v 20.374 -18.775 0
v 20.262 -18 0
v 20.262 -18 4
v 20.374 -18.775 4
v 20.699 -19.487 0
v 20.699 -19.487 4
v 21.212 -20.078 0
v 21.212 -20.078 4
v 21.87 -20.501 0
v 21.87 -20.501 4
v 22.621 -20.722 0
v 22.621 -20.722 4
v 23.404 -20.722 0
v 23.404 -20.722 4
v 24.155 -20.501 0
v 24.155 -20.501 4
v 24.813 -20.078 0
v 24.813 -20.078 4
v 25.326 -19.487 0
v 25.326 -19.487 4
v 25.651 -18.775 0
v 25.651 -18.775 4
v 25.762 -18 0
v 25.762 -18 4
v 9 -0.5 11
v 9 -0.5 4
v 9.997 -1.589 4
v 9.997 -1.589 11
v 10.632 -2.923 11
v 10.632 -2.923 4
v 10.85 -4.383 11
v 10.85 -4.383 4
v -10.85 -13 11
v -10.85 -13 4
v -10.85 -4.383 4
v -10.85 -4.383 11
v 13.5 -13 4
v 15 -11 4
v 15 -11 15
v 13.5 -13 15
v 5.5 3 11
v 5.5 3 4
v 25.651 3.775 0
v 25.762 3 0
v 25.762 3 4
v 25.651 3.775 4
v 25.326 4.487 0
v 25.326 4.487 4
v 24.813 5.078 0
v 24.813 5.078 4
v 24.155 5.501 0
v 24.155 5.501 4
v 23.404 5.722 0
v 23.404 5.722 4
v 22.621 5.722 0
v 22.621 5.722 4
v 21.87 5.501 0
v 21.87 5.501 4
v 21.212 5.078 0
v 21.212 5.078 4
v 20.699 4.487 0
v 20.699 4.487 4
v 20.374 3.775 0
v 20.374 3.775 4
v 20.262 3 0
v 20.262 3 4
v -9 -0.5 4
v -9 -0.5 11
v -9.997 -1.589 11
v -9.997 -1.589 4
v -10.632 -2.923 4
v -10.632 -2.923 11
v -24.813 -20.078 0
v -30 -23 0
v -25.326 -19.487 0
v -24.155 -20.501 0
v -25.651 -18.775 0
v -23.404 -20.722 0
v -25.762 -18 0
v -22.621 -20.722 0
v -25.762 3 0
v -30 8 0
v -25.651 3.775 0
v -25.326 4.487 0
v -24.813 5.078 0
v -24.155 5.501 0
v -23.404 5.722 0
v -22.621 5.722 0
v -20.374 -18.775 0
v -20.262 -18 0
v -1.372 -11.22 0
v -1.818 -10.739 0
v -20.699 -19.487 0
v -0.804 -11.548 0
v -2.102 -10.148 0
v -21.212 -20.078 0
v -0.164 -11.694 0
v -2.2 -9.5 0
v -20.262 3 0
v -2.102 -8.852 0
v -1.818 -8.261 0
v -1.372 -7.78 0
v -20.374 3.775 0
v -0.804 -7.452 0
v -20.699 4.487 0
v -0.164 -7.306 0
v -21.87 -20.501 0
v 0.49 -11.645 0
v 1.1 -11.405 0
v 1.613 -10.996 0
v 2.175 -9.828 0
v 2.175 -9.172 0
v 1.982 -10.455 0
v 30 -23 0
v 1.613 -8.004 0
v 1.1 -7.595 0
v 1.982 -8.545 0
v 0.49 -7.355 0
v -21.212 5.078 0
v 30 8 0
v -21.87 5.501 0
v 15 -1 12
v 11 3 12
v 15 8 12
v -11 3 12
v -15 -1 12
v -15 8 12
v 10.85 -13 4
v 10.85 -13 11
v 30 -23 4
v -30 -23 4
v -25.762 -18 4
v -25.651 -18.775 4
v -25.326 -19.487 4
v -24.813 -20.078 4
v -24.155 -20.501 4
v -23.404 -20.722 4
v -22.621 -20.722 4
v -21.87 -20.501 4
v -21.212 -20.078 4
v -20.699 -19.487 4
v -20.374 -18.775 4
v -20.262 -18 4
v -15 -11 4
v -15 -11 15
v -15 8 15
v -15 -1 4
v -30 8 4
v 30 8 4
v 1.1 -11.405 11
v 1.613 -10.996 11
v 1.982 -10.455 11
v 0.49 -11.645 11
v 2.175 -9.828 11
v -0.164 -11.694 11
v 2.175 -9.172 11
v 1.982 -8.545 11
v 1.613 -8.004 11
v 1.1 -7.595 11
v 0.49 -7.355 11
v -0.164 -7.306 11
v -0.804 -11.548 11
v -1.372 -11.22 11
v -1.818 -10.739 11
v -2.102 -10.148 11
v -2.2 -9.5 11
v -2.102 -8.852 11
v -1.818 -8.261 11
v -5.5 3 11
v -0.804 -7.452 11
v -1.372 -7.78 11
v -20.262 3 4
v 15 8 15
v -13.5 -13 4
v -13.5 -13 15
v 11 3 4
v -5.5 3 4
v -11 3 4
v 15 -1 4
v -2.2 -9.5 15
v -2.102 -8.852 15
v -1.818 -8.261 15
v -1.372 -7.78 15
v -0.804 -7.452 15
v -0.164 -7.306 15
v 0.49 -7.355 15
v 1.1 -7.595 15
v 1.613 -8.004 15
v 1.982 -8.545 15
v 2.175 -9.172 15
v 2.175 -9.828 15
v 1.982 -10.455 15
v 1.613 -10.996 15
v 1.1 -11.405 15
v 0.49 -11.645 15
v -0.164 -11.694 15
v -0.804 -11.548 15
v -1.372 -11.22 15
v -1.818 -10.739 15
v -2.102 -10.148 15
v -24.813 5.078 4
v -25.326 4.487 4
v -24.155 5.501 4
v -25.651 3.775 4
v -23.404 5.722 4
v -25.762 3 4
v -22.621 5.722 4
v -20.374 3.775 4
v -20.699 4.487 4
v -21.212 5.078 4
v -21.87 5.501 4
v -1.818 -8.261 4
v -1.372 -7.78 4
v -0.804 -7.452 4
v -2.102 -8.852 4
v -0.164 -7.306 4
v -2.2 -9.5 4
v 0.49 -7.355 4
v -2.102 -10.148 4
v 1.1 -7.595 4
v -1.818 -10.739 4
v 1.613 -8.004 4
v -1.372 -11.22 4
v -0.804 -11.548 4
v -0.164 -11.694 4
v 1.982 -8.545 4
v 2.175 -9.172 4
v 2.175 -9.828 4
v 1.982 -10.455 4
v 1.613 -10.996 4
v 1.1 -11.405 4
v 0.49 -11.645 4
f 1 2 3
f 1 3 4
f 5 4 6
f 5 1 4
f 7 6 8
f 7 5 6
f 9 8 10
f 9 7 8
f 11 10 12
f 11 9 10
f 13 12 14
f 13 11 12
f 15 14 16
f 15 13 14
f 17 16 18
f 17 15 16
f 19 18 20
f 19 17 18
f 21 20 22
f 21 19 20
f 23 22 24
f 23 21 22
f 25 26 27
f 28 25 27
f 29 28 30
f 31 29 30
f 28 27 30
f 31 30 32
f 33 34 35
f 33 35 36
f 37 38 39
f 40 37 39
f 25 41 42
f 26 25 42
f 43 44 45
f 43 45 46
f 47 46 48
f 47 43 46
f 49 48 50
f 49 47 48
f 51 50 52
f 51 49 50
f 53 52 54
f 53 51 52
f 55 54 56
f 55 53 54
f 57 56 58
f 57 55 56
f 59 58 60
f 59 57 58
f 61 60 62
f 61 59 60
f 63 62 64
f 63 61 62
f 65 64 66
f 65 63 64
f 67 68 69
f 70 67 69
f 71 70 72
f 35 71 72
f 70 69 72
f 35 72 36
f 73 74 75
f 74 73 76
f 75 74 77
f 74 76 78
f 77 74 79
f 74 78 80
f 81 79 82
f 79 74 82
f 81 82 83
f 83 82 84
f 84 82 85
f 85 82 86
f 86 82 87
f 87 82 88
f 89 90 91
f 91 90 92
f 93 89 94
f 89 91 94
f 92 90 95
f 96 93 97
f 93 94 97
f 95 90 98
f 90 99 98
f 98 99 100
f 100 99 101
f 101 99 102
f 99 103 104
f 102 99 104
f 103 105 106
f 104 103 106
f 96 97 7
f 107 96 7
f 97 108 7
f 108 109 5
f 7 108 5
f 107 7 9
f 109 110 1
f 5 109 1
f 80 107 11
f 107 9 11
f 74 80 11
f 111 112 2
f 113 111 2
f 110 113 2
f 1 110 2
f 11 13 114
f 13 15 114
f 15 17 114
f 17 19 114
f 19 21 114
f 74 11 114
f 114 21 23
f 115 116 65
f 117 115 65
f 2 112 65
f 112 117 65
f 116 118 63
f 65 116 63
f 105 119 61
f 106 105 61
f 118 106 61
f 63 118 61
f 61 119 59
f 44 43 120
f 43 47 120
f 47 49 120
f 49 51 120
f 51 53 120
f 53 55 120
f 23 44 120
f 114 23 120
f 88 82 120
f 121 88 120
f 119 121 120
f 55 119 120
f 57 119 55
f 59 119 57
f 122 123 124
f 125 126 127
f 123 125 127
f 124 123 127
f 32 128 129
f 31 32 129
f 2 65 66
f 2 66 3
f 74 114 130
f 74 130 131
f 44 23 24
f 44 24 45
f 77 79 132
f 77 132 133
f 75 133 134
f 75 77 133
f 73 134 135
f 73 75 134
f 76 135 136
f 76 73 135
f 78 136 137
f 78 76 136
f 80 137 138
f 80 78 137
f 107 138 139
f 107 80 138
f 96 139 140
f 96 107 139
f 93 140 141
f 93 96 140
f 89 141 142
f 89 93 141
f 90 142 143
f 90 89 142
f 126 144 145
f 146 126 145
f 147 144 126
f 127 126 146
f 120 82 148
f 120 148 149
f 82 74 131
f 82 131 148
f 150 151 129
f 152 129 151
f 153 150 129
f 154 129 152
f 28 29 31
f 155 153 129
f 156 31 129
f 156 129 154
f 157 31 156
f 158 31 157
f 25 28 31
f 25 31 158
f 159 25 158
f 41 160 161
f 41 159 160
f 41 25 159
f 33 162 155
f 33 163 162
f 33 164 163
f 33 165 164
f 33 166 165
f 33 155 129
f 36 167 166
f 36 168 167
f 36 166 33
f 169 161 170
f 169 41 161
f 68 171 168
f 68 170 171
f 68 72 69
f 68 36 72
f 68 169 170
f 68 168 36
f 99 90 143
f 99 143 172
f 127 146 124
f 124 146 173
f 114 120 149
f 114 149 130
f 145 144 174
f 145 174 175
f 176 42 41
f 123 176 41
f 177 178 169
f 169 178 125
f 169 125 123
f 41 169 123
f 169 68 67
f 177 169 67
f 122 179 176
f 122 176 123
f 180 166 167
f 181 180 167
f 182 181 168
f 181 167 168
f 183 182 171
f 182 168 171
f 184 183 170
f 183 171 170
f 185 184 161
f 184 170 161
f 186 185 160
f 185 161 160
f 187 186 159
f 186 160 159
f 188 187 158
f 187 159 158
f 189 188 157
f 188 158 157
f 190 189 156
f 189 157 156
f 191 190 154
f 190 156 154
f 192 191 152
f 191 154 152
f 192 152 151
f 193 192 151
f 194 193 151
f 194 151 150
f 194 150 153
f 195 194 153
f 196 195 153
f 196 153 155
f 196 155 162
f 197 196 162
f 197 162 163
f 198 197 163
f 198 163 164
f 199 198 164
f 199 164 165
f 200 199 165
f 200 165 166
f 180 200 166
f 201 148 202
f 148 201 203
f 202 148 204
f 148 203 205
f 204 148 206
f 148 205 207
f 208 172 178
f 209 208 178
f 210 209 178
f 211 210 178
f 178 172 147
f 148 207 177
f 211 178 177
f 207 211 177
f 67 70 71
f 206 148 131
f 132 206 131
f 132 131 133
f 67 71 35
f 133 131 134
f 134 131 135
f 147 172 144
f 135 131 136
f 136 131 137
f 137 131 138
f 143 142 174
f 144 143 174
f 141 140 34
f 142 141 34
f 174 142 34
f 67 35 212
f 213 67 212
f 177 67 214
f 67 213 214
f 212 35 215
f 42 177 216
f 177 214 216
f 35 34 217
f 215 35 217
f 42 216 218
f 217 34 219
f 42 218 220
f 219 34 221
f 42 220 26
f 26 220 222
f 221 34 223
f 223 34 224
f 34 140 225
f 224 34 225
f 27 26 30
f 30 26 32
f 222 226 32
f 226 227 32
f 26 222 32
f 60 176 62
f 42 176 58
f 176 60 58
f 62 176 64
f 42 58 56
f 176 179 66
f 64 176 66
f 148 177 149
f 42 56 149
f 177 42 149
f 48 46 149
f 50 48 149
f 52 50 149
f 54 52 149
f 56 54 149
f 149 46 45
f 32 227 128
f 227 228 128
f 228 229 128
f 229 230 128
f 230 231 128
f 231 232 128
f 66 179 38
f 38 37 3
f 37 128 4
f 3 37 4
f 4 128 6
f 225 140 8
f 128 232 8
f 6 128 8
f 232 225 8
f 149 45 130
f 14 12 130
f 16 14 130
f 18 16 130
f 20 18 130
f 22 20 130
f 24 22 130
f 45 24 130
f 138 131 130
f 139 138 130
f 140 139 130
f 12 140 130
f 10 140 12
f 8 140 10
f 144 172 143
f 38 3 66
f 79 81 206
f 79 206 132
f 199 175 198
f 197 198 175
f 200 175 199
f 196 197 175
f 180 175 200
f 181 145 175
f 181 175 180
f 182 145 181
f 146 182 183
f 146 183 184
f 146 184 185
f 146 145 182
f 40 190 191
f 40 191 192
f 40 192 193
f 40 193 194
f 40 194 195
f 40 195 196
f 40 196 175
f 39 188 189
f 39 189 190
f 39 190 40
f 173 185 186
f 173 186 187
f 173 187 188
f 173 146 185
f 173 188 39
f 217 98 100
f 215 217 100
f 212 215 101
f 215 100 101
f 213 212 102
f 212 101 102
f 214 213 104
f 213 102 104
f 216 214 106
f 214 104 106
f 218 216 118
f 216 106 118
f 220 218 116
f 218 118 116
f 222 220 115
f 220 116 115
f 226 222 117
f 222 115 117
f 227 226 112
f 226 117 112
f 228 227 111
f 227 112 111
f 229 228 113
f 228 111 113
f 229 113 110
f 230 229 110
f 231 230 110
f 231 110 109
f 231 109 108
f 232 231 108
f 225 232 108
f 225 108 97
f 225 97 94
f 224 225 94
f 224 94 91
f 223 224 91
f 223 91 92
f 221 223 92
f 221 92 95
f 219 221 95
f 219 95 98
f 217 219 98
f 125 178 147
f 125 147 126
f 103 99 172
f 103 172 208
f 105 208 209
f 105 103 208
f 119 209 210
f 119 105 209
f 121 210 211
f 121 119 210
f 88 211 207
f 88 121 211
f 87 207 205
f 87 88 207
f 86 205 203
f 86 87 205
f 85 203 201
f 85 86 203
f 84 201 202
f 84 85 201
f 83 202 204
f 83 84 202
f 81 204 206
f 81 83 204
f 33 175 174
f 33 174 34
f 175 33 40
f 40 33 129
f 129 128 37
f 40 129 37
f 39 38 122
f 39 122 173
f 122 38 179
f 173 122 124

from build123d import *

# Parameters (mm, degrees)
F0_W         = 30
F0_H         = 26
F1_DEPTH     = 15
F3_SIZE2     = 2
F3_SIZE      = 1.5
F5_DEPTH     = 30.001
F6_SIZE      = 4
F2_W         = 21.7
F2_H         = 7
F7_DEPTH     = 12.5
F8_W         = 11
F8_H         = 7
F9_DEPTH     = 4
F10_W        = 30
F10_H        = 5
F11_DEPTH    = 15.001
F13_D        = 4.4
F15_DEPTH    = 4
F16_SIZE     = 3.49999
F17_T4_DEPTH = 26.4149188769
F18_SIZE     = 3.49999
F19_T4_DEPTH = 26.4149188769


# Not quite as in the source:
# - a fillet or chamfer that OpenCascade refuses, or shapes differently, is made with other operations: its cross-section is extruded or revolved along the edge and cut away or added
# - a fillet or chamfer is up to 0.001 mm smaller than in the source, because OpenCascade refuses the exact size


with BuildPart() as f1:
    # F0 (on Top) → F1 (new body)
    with BuildSketch(Plane.XY):
        Rectangle(F0_W, F0_H)
    extrude(amount=F1_DEPTH)

    # F3
    f3_edges = [f1.edges().sort_by_distance(p)[0] for p in [
        (-15, -13, 7.5),
        (15, -13, 7.5),
    ]]
    f3_side = f1.faces().sort_by_distance((0, -13, 7.5))[0]
    chamfer(f3_edges, length=F3_SIZE, length2=F3_SIZE2, reference=f3_side)

    # F4 (on face) → F5 (cut, through all)
    with BuildSketch(Plane(origin=(-15, 0, 0), x_dir=(0, -1, 0), z_dir=(-1, 0, 0))):
        Polygon((-13, 12), (-13, 0), (-8, 0), (-8, 4), (-3, 4), (-3, 12), align=None)
    extrude(amount=-F5_DEPTH, mode=Mode.SUBTRACT)

    # F6
    f6_edges = [f1.edges().sort_by_distance(p)[0] for p in [
        (-15, 3, 8),
        (15, 3, 8),
    ]]
    chamfer(f6_edges, length=F6_SIZE)

    # F2 (on face) → F7 (cut)
    with BuildSketch(Plane.XZ.offset(13)):
        with Locations((0, 7.5)):
            Rectangle(F2_W, F2_H)
    extrude(amount=-F7_DEPTH, mode=Mode.SUBTRACT)

    # F8 (on face) → F9 (cut)
    with BuildSketch(Plane(origin=(0, 3, 0), x_dir=(-1, 0, 0), z_dir=(0, 1, 0))):
        with Locations((0, 7.5)):
            Rectangle(F8_W, F8_H)
    extrude(amount=-F9_DEPTH, mode=Mode.SUBTRACT)

    # F10 (on face) → F11 (cut, through all)
    with BuildSketch(Plane.XY.offset(15)):
        with Locations((0, 10.5)):
            Rectangle(F10_W, F10_H)
    extrude(amount=-F11_DEPTH, mode=Mode.SUBTRACT)

    # F13 (through all)
    with Locations(Plane.XY.offset(15)):
        with Locations((0, -9.5)):
            Hole(F13_D / 2)

    # F14 (on face) → F15 (join)
    with BuildSketch(Plane(origin=(0, 0, 0), x_dir=(1, 0, 0), z_dir=(0, 0, -1))):
        with BuildLine():
            Line((30, 23), (-30, 23))
            Line((-30, 23), (-30, 11))
            Line((-30, 11), (-25.7624481171, 11))
            Line((-25.7624481171, 11), (-25.7624481171, 18))
            ThreePointArc((-25.7624481171, 18), (-23.0124481171, 20.75), (-20.2624481171, 18))
            Line((-20.2624481171, 18), (-20.2624481171, 11))
            Line((-20.2624481171, 11), (-15, 11))
            Line((-15, 11), (-13.5, 13))
            Line((-13.5, 13), (13.5, 13))
            Line((13.5, 13), (15, 11))
            Line((15, 11), (20.2624481171, 11))
            Line((20.2624481171, 11), (20.2624481171, 18))
            ThreePointArc((20.2624481171, 18), (23.0124481171, 20.75), (25.7624481171, 18))
            Line((25.7624481171, 18), (25.7624481171, 11))
            Line((25.7624481171, 11), (30, 11))
            Line((30, 11), (30, 23))
        make_face()
        with BuildLine():
            Line((-25.7624481171, 11), (-30, 11))
            Line((-30, 11), (-30, -8))
            Line((-30, -8), (-15, -8))
            Line((-15, -8), (-15, 11))
            Line((-15, 11), (-20.2624481171, 11))
            Line((-20.2624481171, 11), (-20.2624481171, -3))
            ThreePointArc((-20.2624481171, -3), (-23.0124481171, -5.75), (-25.7624481171, -3))
            Line((-25.7624481171, -3), (-25.7624481171, 11))
        make_face()
        with BuildLine():
            Line((30, -8), (30, 11))
            Line((30, 11), (25.7624481171, 11))
            Line((25.7624481171, 11), (25.7624481171, -3))
            ThreePointArc((25.7624481171, -3), (23.0124481171, -5.75), (20.2624481171, -3))
            Line((20.2624481171, -3), (20.2624481171, 11))
            Line((20.2624481171, 11), (15, 11))
            Line((15, 11), (15, -8))
            Line((15, -8), (30, -8))
        make_face()
    extrude(amount=-F15_DEPTH)

    # F16 (size 3.5 in the source; OpenCascade refuses exactly that, so slightly less here)
    f16_edges = [f1.edges().sort_by_distance(p)[0] for p in [
        (-5.5, -0.5, 7.5),
    ]]
    chamfer(f16_edges, length=F16_SIZE)

    # F17: fillet of radius 5 on 1 edges, made by hand


with BuildPart() as f17_tool2:
    # F17_s3 → F17_t4 (new body)
    with BuildSketch(Plane.XY.offset(20.7074594385)):
        with BuildLine():
            ThreePointArc((-8.99999, -0.5), (-10.3638647521, -2.2323966462), (-10.85, -4.3829837754))
            Line((-10.85, -4.3829837754), (-10.85, -0.5))
            Line((-10.85, -0.5), (-8.99999, -0.5))
        make_face()
    extrude(amount=-F17_T4_DEPTH)

    split(bisect_by=Plane.XY.offset(15), keep=Keep.BOTTOM)

    split(bisect_by=Plane.XY, keep=Keep.TOP)


with BuildPart() as f1_1:
    add(f1.part)

    # F17_t1: union F17_tool2
    add(f17_tool2.part)

    # F18 (size 3.5 in the source; OpenCascade refuses exactly that, so slightly less here)
    f18_edges = [f1_1.edges().sort_by_distance(p)[0] for p in [
        (5.5, -0.5, 7.5),
    ]]
    chamfer(f18_edges, length=F18_SIZE)

    # F19: fillet of radius 5 on 1 edges, made by hand


with BuildPart() as f19_tool2:
    # F19_s3 → F19_t4 (new body)
    with BuildSketch(Plane.XY.offset(-5.7074594385)):
        with BuildLine():
            ThreePointArc((8.99999, -0.5), (10.3638647521, -2.2323966462), (10.85, -4.3829837754))
            Line((10.85, -4.3829837754), (10.85, -0.5))
            Line((10.85, -0.5), (8.99999, -0.5))
        make_face()
    extrude(amount=F19_T4_DEPTH)

    split(bisect_by=Plane.XY.offset(15), keep=Keep.BOTTOM)

    split(bisect_by=Plane.XY, keep=Keep.TOP)


with BuildPart() as f1_2:
    add(f1_1.part)

    # F19_t1: union F19_tool2
    add(f19_tool2.part)


solid = f1_2.part
